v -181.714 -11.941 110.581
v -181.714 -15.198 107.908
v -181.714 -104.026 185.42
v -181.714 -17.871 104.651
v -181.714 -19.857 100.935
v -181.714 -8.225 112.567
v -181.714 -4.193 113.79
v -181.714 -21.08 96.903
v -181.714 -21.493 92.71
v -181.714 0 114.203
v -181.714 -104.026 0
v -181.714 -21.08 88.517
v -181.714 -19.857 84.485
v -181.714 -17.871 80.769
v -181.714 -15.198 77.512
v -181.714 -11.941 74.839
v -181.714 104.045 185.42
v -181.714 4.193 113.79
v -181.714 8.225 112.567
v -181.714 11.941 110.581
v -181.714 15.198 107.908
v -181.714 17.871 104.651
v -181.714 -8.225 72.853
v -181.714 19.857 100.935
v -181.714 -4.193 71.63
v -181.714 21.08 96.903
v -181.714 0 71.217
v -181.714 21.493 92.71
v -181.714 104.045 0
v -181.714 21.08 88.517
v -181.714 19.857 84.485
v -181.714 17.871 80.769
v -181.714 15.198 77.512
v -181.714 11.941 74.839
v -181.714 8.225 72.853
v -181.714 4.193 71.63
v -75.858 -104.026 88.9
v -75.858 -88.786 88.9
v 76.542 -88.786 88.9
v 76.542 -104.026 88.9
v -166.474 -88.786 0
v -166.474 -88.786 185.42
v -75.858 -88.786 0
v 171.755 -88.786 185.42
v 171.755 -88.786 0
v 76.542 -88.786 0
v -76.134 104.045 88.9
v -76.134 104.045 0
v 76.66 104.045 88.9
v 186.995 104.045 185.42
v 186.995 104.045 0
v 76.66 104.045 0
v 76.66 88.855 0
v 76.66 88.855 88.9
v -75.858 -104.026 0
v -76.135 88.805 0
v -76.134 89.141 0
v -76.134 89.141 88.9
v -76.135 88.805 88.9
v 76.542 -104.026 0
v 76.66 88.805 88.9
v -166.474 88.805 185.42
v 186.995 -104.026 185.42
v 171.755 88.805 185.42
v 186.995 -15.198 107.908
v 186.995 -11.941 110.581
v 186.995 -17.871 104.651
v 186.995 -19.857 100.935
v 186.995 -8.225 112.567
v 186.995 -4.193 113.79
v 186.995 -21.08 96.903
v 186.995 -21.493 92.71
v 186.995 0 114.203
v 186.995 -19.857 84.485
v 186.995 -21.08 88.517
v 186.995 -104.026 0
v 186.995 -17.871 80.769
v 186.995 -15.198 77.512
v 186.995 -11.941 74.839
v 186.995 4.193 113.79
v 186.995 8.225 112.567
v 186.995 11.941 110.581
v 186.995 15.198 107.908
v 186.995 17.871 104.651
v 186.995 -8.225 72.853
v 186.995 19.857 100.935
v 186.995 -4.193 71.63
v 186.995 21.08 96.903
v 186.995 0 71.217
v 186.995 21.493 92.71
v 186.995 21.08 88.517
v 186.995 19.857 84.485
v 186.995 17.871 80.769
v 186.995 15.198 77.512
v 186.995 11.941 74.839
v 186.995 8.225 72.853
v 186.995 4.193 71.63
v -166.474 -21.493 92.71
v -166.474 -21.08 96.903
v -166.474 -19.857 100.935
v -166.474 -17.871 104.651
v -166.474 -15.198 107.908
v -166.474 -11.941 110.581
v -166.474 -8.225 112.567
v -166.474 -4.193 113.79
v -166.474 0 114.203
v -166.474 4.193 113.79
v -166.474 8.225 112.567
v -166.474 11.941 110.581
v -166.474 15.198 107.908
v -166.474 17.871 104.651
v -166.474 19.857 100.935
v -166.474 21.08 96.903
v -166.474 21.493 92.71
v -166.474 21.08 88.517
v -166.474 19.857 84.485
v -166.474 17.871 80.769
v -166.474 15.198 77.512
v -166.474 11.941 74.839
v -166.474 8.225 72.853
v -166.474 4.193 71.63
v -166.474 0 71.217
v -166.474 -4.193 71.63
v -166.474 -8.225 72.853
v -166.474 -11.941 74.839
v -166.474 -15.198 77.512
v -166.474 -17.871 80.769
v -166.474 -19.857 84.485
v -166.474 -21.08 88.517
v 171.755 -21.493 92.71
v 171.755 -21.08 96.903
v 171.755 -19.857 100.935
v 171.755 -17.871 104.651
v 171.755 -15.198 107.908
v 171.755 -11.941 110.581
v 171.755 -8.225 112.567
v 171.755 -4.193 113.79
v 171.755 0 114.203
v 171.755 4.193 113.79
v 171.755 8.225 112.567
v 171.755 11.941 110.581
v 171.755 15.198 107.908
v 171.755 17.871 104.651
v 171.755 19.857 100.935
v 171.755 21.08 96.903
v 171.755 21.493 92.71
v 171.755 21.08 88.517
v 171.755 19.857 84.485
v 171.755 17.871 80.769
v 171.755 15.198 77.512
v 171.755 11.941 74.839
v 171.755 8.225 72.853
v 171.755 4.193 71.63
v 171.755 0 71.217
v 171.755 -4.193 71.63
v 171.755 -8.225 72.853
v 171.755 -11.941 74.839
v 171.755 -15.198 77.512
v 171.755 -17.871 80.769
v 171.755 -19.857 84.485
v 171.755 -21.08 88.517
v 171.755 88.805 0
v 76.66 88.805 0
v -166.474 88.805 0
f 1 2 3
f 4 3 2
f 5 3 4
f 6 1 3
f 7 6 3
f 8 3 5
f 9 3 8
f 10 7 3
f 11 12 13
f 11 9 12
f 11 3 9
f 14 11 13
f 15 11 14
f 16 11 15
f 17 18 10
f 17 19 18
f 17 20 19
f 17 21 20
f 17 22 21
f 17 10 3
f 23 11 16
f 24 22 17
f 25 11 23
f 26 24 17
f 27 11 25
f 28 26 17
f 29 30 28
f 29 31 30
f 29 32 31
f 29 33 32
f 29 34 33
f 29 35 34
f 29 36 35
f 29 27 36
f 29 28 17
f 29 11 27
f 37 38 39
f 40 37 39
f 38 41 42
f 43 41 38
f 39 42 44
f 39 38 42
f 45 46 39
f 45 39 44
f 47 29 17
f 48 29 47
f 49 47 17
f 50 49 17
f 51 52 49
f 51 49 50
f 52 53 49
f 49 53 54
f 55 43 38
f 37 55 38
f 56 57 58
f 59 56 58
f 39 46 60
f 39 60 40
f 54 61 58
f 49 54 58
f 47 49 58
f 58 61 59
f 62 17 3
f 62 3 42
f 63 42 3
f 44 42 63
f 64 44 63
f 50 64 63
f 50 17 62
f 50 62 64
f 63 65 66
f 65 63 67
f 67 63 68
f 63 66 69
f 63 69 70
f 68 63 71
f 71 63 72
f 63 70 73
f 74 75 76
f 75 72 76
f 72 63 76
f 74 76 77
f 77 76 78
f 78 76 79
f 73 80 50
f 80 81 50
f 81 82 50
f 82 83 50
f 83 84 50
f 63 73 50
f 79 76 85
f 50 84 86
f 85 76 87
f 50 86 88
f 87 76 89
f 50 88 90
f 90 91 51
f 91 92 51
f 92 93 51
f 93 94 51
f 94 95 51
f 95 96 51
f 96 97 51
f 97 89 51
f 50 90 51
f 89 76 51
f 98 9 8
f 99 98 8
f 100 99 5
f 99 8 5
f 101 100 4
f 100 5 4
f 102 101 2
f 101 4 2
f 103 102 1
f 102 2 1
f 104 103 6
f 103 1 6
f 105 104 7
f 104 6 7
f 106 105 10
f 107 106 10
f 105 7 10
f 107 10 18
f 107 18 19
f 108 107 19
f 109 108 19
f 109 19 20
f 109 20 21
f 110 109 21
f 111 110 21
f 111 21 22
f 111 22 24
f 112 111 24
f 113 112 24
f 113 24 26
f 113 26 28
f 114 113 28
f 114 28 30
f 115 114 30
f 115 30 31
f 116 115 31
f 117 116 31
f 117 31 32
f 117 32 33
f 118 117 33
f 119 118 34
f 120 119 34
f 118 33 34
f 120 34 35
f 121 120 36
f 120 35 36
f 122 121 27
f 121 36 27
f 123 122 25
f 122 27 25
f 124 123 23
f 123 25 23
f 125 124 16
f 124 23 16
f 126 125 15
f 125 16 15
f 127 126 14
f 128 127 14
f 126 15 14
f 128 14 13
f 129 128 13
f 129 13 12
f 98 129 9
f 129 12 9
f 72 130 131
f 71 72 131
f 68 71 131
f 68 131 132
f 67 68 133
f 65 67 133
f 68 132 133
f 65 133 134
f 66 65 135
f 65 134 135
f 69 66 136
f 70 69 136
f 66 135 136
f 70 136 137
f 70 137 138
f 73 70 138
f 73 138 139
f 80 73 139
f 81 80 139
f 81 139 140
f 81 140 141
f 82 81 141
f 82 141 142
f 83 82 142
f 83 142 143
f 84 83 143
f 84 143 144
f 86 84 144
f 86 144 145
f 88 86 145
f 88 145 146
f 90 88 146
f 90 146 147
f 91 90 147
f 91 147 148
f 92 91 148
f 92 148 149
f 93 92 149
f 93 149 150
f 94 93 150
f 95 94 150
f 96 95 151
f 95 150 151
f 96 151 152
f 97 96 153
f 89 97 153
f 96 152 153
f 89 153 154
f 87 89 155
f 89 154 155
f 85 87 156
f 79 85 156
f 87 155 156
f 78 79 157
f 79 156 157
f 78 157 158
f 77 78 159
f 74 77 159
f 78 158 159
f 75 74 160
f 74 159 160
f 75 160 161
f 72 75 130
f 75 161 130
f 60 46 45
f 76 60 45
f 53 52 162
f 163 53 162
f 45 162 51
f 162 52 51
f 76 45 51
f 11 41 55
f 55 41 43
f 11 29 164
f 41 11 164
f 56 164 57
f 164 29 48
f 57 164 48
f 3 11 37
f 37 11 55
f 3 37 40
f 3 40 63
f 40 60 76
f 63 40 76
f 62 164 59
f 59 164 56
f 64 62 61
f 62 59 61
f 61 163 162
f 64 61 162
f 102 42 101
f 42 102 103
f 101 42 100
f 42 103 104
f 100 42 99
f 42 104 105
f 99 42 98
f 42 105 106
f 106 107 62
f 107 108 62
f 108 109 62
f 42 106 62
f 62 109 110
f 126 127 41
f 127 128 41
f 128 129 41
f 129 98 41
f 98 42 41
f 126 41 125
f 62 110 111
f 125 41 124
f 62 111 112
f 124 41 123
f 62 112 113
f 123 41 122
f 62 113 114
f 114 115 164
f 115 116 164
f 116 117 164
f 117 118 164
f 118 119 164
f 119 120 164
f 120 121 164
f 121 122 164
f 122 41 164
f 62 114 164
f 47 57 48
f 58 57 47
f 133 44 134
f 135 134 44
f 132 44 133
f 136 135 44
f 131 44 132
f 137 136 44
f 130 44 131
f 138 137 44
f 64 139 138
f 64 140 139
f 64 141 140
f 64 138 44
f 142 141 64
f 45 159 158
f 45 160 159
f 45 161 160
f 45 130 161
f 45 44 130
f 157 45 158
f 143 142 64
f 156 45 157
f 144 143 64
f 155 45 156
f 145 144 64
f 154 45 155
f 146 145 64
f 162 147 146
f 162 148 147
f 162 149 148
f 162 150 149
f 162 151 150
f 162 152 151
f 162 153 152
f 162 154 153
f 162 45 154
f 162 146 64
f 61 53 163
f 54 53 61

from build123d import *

# Parameters (mm, degrees)
F0_W     = 368.7085997245
F0_H     = 208.0708047671
F0_W_2   = 338.2285997245
F0_H_2   = 177.5908047671
F1_DEPTH = 185.42
F3_W     = 152.4
F3_H     = 14.9174671465
F4_DEPTH = 88.9
F5_DEPTH = 14.224
F6_DEPTH = 25.4
F7_DEPTH = 25.4
F8_R     = 21.4933910587
F9_DEPTH = 469.9


with BuildPart() as f1:
    # F0 (on Top) → F1 (new body)
    with BuildSketch(Plane.XY):
        with Locations((2.6404061785, 0.0097863376)):
            Rectangle(F0_W, F0_H)
        with Locations((2.6404061785, 0.0097863376)):
            Rectangle(F0_W_2, F0_H_2, mode=Mode.SUBTRACT)
    extrude(amount=F1_DEPTH)

    # F3 (on face) → F4 (cut)
    with BuildSketch(Plane.XY):
        with Locations((0.3421455622, -96.07069315)):
            Rectangle(F3_W, F3_H)
        Polygon((-76.1339217424, 104.031085968), (-76.1339217424, 89.1409292817), (76.6604244709, 88.854573667), (76.6604244709, 104.031085968), align=None)
    extrude(amount=F4_DEPTH, mode=Mode.SUBTRACT)

    # F5 (cut): a face of the model
    f5_faces = [f1.faces().sort_by_distance(p)[0] for p in [
        (0.3421455622, -103.5294267233, 44.45),
    ]]
    extrude(f5_faces, amount=-F5_DEPTH, mode=Mode.SUBTRACT)

    # F6 (cut): a face of the model
    f6_faces = [f1.faces().sort_by_distance(p)[0] for p in [
        (0.2632513642, 88.9977514744, 44.45),
    ]]
    extrude(f6_faces, amount=-F6_DEPTH, mode=Mode.SUBTRACT)

    # F7 (cut): a face of the model
    f7_faces = [f1.faces().sort_by_distance(p)[0] for p in [
        (0.2632513642, 104.031085968, 44.45),
    ]]
    extrude(f7_faces, amount=-F7_DEPTH, mode=Mode.SUBTRACT)

    # F8 (on face) → F9 (cut)
    with BuildSketch(Plane(origin=(-181.7138936837, 0, 0), x_dir=(0, -1, 0), z_dir=(-1, 0, 0))):
        with Locations((0, 92.71)):
            Circle(F8_R)
    extrude(amount=-F9_DEPTH, mode=Mode.SUBTRACT)


solid = f1.part
